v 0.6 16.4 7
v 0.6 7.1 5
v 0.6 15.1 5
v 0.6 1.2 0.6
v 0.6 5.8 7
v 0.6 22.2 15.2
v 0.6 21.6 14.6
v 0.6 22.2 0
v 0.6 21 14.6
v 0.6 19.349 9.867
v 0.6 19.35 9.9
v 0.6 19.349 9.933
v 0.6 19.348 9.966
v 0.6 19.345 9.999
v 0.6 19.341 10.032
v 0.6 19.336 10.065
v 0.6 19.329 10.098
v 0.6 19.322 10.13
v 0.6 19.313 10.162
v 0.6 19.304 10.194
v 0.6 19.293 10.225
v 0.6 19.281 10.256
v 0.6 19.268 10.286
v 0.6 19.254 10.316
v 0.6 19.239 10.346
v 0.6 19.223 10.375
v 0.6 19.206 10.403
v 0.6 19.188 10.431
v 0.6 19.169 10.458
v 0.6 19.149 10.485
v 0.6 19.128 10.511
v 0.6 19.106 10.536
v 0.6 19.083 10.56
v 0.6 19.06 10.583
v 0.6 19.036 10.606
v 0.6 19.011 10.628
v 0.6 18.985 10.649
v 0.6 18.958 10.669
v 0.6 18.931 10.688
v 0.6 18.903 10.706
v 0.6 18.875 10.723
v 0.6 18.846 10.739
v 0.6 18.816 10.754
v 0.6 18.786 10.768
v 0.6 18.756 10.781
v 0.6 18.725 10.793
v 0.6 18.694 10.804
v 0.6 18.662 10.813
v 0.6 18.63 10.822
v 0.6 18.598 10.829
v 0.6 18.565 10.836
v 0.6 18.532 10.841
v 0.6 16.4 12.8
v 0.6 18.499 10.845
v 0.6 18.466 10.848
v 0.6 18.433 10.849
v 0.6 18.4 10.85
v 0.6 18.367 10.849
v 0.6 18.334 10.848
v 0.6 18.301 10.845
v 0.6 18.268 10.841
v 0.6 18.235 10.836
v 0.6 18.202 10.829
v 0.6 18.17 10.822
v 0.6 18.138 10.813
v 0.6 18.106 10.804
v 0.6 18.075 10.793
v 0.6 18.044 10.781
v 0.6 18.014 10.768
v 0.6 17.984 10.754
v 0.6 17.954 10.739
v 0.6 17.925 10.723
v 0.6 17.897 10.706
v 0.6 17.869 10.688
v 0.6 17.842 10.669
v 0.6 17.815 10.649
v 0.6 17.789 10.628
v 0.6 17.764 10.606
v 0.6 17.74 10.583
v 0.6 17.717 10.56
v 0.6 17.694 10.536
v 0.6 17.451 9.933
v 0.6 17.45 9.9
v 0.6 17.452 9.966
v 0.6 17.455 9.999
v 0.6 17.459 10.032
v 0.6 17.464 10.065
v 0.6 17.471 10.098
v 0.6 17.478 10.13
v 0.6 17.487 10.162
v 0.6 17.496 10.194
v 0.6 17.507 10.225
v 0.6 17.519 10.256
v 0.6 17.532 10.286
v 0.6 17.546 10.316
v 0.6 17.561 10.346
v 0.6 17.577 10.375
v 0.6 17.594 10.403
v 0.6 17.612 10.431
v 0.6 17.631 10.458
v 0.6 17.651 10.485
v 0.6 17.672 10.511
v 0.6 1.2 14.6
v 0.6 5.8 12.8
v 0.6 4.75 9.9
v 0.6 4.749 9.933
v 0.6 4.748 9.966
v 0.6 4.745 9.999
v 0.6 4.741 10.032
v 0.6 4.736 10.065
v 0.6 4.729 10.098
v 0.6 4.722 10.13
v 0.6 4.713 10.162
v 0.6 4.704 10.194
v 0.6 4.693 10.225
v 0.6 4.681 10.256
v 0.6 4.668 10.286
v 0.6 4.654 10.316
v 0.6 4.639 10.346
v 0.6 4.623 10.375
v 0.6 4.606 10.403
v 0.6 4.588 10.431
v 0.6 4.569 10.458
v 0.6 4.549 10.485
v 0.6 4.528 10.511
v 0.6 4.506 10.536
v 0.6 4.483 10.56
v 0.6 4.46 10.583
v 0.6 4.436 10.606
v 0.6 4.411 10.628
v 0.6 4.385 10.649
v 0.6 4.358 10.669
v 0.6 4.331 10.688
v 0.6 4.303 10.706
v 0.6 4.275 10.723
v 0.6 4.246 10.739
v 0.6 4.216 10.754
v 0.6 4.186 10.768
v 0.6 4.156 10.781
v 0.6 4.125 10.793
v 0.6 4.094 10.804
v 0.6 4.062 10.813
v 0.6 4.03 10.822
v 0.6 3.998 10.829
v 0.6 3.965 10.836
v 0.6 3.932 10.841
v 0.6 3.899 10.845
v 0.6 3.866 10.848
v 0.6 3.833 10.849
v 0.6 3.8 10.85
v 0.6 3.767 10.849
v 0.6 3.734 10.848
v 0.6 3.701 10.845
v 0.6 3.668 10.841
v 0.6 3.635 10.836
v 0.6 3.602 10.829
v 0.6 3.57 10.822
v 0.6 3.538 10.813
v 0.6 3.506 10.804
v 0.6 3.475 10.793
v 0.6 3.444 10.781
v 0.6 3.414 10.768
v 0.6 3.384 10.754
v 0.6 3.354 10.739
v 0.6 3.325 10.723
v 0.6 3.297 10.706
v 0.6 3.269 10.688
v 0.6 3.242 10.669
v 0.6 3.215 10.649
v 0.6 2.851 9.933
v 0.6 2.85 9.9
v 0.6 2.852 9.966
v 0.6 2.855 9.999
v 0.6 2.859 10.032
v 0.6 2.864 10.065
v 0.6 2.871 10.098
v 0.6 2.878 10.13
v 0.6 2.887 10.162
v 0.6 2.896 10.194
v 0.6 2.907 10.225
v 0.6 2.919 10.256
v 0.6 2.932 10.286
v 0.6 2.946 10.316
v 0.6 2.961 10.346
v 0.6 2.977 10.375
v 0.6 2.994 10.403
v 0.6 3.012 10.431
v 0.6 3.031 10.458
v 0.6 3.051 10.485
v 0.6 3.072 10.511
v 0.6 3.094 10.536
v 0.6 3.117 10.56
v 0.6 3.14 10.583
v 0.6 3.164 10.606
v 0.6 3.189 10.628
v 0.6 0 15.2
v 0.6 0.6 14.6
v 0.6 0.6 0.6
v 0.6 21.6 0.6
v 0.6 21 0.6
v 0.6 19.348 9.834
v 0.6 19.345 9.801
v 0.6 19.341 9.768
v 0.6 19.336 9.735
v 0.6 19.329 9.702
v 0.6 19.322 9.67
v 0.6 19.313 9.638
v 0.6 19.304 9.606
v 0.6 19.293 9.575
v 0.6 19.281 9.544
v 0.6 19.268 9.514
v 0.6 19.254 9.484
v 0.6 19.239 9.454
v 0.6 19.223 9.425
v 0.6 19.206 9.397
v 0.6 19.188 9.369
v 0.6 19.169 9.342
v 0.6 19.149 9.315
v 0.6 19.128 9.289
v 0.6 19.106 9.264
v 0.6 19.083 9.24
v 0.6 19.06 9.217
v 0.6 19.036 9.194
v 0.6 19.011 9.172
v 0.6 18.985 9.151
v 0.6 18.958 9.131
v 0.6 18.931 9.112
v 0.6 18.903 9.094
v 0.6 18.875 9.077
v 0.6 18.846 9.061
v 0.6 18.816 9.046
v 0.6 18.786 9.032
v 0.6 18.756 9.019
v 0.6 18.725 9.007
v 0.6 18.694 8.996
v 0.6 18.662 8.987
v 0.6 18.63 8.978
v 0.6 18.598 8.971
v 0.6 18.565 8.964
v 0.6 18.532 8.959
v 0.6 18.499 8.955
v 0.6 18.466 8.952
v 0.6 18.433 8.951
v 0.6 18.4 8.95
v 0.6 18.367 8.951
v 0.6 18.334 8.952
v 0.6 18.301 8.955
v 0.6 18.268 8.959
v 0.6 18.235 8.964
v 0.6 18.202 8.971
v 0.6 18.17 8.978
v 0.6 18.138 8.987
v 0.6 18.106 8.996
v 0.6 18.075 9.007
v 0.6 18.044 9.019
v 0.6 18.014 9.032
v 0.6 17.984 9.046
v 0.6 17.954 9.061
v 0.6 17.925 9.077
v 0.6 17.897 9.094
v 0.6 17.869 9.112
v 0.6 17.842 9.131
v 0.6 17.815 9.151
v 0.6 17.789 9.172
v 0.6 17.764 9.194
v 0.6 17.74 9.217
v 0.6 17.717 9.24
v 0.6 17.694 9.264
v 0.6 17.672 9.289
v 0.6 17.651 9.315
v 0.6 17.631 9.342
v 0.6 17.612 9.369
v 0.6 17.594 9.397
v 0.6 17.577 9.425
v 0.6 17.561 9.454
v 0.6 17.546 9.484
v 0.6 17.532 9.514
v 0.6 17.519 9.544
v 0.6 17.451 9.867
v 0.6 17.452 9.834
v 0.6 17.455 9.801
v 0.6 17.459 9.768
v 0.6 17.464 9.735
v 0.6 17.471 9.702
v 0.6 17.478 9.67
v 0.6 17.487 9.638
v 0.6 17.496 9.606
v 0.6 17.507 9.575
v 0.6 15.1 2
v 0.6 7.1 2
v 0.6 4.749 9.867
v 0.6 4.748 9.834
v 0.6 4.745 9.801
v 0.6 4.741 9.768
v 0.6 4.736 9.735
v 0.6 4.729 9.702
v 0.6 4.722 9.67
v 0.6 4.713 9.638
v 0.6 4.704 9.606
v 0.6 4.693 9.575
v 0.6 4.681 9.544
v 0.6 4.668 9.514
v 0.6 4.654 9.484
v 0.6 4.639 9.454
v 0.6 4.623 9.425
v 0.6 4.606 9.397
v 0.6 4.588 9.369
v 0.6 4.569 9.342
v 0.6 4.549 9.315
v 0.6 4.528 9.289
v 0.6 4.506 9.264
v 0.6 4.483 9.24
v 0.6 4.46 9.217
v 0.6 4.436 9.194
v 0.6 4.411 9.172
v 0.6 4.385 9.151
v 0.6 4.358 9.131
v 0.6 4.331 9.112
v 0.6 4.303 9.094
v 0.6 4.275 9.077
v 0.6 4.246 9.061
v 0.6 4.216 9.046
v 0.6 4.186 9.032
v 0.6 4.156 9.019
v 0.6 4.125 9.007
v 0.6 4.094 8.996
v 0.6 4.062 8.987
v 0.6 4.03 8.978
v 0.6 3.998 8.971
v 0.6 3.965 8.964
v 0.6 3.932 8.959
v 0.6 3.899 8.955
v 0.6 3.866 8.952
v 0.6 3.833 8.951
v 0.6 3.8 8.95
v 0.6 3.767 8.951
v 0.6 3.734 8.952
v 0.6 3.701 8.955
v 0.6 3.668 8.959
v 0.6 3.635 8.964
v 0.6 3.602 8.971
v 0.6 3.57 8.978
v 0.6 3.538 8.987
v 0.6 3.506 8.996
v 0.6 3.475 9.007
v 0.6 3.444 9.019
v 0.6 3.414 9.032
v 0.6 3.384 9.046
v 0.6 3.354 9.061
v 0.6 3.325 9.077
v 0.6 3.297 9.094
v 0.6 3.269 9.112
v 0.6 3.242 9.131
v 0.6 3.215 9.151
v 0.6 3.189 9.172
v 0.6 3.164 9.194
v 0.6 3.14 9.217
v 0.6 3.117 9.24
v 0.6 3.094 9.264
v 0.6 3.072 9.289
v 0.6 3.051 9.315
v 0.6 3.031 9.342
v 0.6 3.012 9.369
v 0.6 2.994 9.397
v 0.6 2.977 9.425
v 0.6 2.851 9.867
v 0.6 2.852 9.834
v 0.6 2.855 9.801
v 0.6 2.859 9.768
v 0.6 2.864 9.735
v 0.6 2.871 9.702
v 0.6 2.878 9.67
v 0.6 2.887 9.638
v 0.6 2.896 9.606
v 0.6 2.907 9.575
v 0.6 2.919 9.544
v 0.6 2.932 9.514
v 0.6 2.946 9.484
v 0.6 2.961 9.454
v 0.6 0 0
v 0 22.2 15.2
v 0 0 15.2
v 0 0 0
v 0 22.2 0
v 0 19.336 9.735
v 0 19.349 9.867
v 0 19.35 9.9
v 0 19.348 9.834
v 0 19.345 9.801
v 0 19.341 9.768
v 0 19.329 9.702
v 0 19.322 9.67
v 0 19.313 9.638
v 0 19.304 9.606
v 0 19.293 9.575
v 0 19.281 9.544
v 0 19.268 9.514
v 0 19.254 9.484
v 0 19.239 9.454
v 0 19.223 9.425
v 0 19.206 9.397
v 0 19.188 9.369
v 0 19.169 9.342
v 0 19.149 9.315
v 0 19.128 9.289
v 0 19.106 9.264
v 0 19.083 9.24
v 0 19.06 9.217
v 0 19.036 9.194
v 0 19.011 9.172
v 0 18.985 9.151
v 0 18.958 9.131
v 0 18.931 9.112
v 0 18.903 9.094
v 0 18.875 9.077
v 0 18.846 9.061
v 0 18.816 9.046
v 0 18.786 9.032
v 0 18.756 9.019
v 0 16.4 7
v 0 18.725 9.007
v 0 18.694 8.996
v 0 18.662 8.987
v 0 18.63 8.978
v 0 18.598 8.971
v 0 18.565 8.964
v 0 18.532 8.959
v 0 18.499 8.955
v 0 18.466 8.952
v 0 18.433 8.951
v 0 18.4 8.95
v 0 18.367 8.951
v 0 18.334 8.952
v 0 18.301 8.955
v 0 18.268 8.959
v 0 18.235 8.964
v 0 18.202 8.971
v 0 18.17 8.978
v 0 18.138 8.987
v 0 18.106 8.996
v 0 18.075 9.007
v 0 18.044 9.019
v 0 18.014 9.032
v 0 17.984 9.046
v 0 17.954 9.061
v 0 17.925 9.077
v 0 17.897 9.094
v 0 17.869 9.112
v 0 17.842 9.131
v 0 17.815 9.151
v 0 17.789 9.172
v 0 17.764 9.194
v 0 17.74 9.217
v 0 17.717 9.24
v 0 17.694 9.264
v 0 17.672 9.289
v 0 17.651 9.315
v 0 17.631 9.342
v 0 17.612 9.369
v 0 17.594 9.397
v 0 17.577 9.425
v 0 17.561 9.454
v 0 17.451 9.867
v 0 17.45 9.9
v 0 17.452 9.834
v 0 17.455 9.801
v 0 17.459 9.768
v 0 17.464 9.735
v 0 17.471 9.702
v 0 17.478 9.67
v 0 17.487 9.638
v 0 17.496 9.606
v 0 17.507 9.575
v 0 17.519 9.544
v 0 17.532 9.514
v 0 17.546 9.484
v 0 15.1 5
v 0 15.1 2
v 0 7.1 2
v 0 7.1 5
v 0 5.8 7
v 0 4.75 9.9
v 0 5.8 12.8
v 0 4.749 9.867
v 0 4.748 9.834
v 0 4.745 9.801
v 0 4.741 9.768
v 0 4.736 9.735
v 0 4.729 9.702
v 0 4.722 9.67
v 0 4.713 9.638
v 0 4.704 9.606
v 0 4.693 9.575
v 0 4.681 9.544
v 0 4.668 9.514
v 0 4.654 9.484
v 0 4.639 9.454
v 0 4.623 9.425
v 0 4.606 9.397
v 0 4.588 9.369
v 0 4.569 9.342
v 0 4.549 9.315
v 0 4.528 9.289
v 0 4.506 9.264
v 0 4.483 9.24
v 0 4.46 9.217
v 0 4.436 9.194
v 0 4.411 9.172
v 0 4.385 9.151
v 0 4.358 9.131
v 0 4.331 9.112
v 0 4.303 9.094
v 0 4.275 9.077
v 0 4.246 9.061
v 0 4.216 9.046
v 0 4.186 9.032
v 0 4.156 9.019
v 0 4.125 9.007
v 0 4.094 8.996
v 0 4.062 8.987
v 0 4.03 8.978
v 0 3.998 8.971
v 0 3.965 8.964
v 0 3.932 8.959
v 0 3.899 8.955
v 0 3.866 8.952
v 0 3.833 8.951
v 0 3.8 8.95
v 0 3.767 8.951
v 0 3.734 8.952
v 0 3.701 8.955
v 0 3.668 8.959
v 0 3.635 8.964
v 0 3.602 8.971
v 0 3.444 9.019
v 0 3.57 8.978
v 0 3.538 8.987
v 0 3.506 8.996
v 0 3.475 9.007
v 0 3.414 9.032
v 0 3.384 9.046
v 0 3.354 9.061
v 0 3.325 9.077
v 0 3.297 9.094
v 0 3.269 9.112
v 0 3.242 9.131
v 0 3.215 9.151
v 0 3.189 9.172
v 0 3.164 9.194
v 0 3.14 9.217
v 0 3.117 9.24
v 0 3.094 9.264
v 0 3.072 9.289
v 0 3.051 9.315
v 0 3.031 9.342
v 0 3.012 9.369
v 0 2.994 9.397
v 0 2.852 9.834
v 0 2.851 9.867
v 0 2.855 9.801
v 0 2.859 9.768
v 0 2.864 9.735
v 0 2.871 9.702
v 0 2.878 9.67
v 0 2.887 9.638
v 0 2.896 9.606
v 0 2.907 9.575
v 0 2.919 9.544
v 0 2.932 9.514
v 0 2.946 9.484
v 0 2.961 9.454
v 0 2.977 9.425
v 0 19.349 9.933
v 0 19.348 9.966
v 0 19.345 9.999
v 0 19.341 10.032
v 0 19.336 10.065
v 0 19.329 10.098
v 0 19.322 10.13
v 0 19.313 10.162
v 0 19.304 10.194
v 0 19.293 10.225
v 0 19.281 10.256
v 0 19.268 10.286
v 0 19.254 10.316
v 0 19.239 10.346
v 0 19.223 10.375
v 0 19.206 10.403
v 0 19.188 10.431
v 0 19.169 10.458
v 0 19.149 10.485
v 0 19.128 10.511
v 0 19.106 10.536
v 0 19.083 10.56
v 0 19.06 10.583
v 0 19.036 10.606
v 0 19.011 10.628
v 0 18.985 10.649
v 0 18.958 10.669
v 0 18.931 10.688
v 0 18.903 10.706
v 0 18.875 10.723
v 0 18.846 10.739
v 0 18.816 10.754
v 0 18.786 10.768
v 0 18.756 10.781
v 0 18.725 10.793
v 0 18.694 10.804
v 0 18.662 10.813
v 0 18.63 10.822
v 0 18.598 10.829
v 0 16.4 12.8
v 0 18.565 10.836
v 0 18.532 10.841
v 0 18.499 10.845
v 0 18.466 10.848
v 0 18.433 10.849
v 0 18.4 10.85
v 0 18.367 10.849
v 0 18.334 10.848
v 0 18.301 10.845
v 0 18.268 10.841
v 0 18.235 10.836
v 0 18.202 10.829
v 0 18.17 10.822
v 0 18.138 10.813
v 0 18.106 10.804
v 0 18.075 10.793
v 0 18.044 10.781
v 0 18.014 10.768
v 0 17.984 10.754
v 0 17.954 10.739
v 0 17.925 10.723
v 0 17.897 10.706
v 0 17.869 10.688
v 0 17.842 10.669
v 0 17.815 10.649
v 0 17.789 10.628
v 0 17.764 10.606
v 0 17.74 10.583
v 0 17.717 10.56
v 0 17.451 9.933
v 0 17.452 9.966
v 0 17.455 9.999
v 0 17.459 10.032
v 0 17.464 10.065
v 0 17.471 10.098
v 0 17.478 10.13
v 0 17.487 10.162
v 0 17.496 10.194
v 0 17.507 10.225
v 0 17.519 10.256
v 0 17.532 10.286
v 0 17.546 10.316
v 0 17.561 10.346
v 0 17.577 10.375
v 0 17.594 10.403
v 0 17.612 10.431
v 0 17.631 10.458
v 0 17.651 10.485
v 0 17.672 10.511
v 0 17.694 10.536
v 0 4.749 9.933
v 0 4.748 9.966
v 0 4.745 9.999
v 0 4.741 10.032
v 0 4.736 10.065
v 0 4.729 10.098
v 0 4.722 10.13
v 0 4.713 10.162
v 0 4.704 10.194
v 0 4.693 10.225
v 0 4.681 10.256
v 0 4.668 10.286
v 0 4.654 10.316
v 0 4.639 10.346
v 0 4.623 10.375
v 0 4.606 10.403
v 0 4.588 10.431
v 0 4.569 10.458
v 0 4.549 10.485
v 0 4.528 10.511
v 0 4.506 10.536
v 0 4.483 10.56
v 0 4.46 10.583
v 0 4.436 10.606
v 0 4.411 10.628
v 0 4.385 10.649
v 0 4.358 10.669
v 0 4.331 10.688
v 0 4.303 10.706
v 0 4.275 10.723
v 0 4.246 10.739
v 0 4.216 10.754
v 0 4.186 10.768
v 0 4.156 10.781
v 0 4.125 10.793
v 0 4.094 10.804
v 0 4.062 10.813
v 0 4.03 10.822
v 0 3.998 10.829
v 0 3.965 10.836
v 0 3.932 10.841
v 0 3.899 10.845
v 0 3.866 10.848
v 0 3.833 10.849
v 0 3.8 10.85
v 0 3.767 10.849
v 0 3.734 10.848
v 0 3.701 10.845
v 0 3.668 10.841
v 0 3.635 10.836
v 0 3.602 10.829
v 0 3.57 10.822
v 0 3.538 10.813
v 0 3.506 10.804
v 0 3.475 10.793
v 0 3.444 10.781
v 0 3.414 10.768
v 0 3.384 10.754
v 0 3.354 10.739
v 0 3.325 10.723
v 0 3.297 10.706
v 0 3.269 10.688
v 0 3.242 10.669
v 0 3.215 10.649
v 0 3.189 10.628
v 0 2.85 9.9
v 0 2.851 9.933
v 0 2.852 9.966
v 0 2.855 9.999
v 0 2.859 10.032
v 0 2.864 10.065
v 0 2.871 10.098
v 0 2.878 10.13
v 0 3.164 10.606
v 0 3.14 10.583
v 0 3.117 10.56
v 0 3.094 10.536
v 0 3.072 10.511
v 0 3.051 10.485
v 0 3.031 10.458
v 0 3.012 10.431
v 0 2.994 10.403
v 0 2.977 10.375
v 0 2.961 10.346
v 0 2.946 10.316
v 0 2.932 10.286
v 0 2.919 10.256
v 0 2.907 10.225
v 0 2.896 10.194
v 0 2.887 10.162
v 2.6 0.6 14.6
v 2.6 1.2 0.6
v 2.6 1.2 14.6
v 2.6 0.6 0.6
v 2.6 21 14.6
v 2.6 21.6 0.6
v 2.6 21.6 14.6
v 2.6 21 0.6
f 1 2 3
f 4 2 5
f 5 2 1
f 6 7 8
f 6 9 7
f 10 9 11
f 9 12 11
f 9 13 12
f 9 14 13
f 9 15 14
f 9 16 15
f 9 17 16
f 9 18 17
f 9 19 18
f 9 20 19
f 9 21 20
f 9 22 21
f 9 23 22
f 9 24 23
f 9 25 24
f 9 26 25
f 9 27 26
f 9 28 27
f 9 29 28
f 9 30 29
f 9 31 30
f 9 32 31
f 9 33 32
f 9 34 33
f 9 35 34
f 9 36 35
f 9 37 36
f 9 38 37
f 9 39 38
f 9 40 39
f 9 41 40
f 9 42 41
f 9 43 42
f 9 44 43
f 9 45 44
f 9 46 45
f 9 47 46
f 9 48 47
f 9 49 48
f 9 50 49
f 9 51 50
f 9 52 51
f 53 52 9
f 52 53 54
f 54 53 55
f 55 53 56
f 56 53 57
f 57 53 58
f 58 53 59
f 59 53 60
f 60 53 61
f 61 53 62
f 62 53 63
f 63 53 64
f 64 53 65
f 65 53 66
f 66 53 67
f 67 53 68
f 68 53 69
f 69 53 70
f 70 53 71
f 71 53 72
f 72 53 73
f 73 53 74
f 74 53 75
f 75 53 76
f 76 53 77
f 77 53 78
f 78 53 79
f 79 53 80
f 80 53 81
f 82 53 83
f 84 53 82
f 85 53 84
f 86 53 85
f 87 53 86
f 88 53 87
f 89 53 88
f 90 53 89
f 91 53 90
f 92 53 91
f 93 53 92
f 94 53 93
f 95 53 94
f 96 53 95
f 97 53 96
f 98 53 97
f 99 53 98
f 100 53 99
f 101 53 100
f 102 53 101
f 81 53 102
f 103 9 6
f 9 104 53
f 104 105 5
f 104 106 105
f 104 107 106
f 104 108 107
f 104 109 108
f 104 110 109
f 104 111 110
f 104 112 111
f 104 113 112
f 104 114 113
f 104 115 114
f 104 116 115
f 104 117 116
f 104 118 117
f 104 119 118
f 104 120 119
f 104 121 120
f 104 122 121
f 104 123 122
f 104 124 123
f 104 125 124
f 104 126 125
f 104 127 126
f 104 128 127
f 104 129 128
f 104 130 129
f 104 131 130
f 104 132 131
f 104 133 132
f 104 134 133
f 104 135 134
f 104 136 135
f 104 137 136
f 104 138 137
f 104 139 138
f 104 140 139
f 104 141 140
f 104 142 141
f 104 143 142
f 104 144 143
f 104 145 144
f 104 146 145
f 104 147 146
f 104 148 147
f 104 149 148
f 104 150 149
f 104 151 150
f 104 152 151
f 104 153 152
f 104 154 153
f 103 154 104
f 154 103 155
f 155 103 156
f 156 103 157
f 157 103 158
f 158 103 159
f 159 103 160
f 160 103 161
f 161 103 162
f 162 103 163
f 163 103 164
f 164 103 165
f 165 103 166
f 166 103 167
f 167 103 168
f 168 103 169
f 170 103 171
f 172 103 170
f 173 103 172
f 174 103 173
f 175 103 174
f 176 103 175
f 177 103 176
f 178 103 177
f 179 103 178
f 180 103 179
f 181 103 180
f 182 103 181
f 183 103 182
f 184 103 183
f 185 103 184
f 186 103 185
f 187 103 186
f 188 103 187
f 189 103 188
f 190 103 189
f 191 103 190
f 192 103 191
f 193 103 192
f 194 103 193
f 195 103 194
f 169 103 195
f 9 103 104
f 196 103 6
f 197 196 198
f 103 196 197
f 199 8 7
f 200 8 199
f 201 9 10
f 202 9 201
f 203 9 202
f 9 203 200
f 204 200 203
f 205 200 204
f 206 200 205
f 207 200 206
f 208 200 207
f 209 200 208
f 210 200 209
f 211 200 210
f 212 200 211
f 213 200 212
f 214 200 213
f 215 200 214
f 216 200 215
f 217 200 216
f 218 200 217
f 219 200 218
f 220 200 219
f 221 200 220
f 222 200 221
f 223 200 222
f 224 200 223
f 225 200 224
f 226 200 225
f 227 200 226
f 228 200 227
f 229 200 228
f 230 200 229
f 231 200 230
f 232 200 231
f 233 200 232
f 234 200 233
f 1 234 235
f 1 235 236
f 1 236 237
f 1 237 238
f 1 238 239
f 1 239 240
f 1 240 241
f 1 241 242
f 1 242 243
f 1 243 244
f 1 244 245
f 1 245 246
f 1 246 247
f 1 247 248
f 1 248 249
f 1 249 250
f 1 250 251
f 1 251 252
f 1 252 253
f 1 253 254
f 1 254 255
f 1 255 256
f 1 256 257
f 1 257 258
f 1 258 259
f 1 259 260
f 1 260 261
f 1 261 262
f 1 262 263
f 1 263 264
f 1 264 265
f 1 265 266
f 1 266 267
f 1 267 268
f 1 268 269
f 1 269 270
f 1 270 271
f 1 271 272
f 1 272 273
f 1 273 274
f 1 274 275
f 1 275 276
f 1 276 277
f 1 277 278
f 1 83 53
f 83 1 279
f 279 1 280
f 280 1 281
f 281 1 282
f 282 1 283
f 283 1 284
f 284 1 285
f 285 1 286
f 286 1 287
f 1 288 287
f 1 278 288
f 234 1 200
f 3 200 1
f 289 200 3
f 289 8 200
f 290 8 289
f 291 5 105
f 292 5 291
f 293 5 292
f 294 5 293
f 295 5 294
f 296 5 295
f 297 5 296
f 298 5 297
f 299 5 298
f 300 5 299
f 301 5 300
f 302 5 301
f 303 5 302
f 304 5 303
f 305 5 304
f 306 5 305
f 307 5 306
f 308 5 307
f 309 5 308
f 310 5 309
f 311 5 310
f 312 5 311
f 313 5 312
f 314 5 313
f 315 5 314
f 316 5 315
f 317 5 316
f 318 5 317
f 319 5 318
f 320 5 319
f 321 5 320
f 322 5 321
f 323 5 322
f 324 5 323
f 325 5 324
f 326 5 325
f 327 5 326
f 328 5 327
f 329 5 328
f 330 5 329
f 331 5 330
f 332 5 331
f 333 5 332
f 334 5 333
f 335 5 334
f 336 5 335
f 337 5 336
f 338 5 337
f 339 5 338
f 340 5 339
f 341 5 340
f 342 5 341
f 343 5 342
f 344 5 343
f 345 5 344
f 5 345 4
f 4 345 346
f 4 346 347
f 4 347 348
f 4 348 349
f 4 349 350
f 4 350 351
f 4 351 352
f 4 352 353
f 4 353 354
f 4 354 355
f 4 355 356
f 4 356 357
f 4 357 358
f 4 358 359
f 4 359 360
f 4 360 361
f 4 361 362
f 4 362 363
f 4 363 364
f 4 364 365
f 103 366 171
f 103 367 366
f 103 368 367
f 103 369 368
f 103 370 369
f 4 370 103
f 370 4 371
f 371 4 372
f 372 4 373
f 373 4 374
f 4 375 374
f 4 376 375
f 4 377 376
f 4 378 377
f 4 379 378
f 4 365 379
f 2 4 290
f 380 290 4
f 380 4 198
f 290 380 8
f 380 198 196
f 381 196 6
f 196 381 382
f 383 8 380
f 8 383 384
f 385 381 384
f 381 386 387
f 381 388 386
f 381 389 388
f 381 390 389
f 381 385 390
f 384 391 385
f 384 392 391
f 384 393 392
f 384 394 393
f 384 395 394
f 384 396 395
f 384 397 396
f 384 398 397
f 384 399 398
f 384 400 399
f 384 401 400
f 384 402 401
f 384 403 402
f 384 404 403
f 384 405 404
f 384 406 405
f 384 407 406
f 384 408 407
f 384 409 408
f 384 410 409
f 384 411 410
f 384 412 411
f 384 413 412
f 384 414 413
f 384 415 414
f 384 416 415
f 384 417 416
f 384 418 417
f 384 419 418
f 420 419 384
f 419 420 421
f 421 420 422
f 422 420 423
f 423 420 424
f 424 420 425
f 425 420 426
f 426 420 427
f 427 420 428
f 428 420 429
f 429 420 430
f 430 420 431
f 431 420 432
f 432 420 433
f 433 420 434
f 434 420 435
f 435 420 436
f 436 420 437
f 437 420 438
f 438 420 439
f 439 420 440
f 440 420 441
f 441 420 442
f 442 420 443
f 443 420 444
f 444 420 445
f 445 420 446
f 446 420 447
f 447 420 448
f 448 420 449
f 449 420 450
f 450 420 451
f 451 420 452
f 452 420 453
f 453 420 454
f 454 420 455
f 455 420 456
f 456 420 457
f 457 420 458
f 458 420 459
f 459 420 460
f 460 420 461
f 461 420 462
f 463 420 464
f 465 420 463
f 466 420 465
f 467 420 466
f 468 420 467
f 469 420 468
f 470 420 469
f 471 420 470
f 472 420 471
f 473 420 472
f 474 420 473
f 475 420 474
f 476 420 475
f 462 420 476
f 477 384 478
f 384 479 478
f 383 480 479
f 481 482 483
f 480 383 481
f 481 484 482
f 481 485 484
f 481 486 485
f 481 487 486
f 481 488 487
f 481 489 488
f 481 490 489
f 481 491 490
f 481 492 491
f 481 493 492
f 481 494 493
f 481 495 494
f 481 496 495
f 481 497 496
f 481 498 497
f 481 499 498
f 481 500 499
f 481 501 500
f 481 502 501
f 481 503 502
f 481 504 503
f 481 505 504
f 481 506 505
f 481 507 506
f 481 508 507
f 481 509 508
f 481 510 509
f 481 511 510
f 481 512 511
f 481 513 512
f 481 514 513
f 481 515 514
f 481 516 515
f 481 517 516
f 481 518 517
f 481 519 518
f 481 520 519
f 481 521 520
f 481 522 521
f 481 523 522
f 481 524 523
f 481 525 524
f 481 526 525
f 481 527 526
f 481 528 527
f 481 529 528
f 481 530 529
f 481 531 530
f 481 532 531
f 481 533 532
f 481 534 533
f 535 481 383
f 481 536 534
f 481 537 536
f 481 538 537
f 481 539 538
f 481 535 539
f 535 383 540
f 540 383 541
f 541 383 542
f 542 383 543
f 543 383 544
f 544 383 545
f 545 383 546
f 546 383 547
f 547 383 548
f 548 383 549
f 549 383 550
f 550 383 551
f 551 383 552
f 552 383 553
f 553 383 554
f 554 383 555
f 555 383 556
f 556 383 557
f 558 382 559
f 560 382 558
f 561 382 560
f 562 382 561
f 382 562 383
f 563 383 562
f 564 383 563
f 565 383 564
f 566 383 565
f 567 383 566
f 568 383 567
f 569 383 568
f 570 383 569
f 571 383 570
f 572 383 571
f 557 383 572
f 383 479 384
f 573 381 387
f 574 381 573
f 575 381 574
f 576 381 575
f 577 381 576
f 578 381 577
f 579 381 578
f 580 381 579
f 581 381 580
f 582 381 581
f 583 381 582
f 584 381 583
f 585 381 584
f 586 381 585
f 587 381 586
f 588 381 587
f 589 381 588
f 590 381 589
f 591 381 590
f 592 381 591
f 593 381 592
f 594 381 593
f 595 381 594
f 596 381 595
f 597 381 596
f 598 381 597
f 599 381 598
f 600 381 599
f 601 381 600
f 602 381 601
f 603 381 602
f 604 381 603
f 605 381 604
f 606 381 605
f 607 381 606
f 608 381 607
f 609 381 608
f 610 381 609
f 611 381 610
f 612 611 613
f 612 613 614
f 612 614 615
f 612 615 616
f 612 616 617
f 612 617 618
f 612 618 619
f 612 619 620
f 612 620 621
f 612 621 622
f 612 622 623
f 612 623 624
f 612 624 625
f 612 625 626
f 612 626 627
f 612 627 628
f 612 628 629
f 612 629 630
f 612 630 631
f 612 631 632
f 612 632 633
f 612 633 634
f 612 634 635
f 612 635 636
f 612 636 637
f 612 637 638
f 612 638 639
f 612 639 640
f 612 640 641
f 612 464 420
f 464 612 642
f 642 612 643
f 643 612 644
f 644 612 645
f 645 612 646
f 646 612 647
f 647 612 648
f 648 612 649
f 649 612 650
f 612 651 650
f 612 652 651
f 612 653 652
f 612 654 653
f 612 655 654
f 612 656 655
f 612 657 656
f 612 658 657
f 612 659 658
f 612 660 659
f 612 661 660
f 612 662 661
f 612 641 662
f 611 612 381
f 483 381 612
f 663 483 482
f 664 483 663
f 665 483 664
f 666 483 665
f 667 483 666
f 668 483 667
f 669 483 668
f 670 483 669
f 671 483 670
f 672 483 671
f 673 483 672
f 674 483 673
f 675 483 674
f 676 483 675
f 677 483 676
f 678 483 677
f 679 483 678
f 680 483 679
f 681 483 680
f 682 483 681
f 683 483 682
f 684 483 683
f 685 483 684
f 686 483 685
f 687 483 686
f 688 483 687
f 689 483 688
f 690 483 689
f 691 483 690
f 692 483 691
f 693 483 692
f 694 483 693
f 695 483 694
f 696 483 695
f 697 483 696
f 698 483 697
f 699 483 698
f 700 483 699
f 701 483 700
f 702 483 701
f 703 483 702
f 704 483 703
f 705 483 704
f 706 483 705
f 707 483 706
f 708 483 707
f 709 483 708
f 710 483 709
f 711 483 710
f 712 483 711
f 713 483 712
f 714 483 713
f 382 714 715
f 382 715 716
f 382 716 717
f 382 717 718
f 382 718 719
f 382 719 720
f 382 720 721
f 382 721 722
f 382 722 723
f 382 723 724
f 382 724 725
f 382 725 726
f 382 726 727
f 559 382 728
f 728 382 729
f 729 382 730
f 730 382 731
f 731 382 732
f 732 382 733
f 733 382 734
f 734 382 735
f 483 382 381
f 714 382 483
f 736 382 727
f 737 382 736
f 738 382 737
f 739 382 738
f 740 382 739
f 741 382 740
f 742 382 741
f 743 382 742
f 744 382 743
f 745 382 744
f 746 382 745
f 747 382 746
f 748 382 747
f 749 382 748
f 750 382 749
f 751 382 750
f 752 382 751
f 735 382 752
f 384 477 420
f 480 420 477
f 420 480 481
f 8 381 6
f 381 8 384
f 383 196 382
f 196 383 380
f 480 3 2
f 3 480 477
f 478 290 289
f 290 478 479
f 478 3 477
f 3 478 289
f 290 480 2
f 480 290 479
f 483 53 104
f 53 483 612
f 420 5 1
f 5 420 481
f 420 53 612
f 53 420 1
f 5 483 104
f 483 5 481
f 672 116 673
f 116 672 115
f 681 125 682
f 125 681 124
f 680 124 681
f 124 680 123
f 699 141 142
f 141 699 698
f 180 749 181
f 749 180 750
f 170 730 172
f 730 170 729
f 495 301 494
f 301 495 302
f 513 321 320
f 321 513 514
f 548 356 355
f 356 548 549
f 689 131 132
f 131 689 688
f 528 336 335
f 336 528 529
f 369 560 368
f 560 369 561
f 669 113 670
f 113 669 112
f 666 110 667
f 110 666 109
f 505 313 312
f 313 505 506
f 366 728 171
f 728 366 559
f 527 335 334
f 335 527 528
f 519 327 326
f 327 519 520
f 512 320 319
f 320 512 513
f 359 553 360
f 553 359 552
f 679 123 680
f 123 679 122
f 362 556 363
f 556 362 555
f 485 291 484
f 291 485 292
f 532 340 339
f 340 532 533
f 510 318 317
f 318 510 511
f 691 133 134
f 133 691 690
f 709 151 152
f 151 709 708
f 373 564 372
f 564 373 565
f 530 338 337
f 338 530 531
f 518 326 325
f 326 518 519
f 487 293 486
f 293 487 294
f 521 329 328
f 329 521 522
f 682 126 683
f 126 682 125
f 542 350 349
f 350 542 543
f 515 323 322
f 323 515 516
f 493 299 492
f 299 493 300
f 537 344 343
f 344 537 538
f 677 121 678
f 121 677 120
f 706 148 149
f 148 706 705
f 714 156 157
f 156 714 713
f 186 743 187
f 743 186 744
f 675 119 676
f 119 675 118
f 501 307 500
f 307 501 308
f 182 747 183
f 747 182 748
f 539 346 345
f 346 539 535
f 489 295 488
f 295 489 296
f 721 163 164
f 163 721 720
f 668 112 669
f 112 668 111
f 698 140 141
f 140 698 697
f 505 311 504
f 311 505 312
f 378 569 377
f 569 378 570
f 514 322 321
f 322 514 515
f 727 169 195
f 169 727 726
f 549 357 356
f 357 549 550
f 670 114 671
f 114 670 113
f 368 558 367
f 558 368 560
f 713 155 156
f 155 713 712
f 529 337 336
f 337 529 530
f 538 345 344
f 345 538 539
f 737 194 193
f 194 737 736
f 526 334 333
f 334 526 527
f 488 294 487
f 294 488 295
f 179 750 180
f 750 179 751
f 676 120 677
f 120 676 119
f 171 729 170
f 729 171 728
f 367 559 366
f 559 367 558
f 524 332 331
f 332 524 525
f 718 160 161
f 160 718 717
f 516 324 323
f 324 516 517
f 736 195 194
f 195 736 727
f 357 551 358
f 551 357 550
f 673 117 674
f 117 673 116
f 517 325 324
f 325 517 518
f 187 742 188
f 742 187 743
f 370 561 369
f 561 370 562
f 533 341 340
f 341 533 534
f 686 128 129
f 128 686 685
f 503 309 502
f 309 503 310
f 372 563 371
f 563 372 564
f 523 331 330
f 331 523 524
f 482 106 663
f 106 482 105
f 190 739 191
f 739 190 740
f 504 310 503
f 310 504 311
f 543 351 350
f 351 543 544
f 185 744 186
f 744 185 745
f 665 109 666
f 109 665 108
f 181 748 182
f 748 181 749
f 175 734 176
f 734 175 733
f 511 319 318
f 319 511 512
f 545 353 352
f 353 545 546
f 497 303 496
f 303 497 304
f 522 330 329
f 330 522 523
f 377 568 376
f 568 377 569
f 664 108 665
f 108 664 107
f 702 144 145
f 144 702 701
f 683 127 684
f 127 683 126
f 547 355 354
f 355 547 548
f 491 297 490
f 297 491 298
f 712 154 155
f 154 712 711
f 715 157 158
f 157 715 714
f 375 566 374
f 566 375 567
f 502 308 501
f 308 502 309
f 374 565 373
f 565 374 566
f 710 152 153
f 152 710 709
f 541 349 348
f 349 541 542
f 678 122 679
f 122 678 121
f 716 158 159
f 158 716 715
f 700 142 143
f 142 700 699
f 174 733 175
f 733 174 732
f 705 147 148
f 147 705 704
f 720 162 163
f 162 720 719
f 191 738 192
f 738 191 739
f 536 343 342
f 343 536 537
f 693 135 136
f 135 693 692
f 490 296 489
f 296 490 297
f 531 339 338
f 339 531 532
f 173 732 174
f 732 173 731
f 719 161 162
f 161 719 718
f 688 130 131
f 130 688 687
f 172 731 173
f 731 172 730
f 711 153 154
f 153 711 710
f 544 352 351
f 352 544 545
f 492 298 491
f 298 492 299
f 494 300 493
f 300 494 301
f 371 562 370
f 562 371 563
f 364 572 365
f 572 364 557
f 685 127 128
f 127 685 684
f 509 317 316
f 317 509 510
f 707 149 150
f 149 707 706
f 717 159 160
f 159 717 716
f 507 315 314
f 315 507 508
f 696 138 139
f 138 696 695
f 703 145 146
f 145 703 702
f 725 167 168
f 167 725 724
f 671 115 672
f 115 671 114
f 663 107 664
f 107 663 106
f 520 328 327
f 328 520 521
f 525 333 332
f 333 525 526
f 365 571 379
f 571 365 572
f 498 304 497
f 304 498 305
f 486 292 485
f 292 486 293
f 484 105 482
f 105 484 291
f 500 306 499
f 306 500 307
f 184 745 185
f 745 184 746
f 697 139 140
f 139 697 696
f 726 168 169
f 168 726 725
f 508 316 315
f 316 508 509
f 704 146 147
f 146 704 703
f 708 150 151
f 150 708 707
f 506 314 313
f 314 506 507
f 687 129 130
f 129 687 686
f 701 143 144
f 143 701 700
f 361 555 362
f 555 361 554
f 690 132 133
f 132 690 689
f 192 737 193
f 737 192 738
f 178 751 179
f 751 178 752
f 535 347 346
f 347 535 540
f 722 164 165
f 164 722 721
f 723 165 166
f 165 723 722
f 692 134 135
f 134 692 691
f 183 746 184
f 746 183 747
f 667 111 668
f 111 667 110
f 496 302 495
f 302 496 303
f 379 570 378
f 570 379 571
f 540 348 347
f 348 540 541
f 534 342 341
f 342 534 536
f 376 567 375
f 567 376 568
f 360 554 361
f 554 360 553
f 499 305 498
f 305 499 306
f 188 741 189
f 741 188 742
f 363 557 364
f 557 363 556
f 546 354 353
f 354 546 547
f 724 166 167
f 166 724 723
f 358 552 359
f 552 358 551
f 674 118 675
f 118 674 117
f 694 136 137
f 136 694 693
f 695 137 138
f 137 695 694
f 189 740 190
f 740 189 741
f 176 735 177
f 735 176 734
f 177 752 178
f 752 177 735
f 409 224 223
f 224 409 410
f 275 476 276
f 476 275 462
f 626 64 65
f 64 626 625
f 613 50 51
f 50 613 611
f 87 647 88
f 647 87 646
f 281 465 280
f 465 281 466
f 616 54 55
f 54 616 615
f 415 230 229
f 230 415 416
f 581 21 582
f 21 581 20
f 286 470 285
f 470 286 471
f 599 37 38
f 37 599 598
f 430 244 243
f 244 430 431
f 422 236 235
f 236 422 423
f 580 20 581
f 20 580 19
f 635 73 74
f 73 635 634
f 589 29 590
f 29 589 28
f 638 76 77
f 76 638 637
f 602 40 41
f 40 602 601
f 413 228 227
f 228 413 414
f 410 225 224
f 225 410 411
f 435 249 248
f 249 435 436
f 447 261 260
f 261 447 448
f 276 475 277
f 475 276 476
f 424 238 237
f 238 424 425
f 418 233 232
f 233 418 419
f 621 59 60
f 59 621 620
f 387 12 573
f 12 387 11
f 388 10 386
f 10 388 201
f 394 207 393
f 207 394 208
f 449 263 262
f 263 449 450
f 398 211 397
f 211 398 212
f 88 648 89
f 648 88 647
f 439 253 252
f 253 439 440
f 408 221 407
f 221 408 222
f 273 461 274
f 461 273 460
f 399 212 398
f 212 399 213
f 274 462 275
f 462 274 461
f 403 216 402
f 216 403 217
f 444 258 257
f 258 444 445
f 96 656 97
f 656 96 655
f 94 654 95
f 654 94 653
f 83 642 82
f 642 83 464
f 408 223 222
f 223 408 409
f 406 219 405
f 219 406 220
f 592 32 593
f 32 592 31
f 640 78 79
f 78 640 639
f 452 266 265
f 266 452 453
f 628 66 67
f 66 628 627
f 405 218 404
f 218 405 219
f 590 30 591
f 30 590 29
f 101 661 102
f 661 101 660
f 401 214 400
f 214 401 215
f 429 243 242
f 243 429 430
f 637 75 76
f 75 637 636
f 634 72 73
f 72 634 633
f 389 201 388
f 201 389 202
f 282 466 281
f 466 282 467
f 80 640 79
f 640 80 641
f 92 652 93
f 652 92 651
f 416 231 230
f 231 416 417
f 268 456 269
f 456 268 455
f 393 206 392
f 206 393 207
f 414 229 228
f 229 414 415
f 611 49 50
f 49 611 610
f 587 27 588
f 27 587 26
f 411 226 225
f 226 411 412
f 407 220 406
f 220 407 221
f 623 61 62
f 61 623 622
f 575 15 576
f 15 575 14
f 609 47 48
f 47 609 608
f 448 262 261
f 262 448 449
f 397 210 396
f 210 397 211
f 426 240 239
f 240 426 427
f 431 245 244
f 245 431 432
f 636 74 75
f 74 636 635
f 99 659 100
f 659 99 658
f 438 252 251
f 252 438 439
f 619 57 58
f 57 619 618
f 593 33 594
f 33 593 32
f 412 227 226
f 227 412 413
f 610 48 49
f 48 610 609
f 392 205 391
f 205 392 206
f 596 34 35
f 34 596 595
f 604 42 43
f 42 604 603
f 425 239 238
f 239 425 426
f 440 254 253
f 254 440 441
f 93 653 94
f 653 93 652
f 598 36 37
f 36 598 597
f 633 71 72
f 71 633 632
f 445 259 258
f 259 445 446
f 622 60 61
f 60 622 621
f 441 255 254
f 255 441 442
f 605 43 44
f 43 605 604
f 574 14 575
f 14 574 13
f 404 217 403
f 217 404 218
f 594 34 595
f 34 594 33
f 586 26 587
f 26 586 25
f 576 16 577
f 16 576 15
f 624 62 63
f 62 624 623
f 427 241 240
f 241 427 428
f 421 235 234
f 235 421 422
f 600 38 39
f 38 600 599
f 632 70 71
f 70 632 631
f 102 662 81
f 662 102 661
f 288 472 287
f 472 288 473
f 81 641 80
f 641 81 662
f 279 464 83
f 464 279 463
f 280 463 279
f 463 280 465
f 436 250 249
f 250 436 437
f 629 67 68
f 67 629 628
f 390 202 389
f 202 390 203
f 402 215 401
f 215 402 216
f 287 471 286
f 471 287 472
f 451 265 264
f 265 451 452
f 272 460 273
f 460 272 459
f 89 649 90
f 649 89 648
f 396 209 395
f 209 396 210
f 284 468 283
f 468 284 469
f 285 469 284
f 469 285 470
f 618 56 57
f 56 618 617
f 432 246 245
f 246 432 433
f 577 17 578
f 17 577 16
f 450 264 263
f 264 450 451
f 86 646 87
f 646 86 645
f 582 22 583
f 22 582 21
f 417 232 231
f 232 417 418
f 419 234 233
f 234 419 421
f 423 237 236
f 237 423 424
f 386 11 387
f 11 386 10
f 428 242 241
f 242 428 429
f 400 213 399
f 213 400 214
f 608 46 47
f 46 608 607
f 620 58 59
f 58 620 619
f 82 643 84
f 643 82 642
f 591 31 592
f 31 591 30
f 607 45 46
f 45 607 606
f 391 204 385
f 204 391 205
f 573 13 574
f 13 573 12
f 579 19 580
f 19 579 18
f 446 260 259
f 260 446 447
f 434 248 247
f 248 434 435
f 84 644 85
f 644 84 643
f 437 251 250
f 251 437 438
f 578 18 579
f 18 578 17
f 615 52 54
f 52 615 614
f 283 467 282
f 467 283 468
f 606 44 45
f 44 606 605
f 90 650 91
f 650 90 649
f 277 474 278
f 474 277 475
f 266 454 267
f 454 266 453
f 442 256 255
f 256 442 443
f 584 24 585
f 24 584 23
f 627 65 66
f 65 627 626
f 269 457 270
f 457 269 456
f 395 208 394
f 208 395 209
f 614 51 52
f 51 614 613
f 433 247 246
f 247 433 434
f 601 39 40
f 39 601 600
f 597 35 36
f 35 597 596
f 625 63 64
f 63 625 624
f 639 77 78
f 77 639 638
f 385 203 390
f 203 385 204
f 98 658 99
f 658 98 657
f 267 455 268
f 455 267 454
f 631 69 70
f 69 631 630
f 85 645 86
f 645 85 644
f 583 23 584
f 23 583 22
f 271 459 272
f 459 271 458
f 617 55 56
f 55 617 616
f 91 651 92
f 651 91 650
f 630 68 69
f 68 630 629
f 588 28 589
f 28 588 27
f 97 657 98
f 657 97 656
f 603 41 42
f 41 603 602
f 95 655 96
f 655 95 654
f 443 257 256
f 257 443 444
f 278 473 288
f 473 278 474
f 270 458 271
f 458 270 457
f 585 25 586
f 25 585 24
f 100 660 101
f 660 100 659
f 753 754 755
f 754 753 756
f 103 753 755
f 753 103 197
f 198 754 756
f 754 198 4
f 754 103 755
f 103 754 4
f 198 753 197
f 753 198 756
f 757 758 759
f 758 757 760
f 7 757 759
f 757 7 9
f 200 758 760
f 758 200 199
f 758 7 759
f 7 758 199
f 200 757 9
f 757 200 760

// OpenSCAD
thickness = 0.6;
width = 21;
height = 14;
length = 2;

usb_width = 8;
usb_height = 3;

switch_width = 10.6;
switch_height = 5.8;
screw_radius = 1.9 / 2;
screw_distance = 14.6;

$fn = 180;

difference() {
    cube([thickness, width + 2 * thickness, height + 2 * thickness]); // back
    
    translate([-5, width / 2 + thickness - usb_width / 2, 2]) cube([10, usb_width, usb_height]);
    
    translate([-5, width / 2 + thickness - switch_width / 2, 7]) cube([10, switch_width, switch_height]);
    
    translate([-5, width / 2 + thickness - screw_distance / 2, 7 + switch_height / 2])
        rotate([0, 90, 0])
            cylinder(10, screw_radius, screw_radius);

    translate([-5, width / 2 + thickness + screw_distance / 2, 7 + switch_height / 2])
        rotate([0, 90, 0])
            cylinder(10, screw_radius, screw_radius);
}

translate([thickness, thickness, thickness]) cube([length, thickness, height]); // left
translate([thickness, width, thickness]) cube([length, thickness, height]); // right
